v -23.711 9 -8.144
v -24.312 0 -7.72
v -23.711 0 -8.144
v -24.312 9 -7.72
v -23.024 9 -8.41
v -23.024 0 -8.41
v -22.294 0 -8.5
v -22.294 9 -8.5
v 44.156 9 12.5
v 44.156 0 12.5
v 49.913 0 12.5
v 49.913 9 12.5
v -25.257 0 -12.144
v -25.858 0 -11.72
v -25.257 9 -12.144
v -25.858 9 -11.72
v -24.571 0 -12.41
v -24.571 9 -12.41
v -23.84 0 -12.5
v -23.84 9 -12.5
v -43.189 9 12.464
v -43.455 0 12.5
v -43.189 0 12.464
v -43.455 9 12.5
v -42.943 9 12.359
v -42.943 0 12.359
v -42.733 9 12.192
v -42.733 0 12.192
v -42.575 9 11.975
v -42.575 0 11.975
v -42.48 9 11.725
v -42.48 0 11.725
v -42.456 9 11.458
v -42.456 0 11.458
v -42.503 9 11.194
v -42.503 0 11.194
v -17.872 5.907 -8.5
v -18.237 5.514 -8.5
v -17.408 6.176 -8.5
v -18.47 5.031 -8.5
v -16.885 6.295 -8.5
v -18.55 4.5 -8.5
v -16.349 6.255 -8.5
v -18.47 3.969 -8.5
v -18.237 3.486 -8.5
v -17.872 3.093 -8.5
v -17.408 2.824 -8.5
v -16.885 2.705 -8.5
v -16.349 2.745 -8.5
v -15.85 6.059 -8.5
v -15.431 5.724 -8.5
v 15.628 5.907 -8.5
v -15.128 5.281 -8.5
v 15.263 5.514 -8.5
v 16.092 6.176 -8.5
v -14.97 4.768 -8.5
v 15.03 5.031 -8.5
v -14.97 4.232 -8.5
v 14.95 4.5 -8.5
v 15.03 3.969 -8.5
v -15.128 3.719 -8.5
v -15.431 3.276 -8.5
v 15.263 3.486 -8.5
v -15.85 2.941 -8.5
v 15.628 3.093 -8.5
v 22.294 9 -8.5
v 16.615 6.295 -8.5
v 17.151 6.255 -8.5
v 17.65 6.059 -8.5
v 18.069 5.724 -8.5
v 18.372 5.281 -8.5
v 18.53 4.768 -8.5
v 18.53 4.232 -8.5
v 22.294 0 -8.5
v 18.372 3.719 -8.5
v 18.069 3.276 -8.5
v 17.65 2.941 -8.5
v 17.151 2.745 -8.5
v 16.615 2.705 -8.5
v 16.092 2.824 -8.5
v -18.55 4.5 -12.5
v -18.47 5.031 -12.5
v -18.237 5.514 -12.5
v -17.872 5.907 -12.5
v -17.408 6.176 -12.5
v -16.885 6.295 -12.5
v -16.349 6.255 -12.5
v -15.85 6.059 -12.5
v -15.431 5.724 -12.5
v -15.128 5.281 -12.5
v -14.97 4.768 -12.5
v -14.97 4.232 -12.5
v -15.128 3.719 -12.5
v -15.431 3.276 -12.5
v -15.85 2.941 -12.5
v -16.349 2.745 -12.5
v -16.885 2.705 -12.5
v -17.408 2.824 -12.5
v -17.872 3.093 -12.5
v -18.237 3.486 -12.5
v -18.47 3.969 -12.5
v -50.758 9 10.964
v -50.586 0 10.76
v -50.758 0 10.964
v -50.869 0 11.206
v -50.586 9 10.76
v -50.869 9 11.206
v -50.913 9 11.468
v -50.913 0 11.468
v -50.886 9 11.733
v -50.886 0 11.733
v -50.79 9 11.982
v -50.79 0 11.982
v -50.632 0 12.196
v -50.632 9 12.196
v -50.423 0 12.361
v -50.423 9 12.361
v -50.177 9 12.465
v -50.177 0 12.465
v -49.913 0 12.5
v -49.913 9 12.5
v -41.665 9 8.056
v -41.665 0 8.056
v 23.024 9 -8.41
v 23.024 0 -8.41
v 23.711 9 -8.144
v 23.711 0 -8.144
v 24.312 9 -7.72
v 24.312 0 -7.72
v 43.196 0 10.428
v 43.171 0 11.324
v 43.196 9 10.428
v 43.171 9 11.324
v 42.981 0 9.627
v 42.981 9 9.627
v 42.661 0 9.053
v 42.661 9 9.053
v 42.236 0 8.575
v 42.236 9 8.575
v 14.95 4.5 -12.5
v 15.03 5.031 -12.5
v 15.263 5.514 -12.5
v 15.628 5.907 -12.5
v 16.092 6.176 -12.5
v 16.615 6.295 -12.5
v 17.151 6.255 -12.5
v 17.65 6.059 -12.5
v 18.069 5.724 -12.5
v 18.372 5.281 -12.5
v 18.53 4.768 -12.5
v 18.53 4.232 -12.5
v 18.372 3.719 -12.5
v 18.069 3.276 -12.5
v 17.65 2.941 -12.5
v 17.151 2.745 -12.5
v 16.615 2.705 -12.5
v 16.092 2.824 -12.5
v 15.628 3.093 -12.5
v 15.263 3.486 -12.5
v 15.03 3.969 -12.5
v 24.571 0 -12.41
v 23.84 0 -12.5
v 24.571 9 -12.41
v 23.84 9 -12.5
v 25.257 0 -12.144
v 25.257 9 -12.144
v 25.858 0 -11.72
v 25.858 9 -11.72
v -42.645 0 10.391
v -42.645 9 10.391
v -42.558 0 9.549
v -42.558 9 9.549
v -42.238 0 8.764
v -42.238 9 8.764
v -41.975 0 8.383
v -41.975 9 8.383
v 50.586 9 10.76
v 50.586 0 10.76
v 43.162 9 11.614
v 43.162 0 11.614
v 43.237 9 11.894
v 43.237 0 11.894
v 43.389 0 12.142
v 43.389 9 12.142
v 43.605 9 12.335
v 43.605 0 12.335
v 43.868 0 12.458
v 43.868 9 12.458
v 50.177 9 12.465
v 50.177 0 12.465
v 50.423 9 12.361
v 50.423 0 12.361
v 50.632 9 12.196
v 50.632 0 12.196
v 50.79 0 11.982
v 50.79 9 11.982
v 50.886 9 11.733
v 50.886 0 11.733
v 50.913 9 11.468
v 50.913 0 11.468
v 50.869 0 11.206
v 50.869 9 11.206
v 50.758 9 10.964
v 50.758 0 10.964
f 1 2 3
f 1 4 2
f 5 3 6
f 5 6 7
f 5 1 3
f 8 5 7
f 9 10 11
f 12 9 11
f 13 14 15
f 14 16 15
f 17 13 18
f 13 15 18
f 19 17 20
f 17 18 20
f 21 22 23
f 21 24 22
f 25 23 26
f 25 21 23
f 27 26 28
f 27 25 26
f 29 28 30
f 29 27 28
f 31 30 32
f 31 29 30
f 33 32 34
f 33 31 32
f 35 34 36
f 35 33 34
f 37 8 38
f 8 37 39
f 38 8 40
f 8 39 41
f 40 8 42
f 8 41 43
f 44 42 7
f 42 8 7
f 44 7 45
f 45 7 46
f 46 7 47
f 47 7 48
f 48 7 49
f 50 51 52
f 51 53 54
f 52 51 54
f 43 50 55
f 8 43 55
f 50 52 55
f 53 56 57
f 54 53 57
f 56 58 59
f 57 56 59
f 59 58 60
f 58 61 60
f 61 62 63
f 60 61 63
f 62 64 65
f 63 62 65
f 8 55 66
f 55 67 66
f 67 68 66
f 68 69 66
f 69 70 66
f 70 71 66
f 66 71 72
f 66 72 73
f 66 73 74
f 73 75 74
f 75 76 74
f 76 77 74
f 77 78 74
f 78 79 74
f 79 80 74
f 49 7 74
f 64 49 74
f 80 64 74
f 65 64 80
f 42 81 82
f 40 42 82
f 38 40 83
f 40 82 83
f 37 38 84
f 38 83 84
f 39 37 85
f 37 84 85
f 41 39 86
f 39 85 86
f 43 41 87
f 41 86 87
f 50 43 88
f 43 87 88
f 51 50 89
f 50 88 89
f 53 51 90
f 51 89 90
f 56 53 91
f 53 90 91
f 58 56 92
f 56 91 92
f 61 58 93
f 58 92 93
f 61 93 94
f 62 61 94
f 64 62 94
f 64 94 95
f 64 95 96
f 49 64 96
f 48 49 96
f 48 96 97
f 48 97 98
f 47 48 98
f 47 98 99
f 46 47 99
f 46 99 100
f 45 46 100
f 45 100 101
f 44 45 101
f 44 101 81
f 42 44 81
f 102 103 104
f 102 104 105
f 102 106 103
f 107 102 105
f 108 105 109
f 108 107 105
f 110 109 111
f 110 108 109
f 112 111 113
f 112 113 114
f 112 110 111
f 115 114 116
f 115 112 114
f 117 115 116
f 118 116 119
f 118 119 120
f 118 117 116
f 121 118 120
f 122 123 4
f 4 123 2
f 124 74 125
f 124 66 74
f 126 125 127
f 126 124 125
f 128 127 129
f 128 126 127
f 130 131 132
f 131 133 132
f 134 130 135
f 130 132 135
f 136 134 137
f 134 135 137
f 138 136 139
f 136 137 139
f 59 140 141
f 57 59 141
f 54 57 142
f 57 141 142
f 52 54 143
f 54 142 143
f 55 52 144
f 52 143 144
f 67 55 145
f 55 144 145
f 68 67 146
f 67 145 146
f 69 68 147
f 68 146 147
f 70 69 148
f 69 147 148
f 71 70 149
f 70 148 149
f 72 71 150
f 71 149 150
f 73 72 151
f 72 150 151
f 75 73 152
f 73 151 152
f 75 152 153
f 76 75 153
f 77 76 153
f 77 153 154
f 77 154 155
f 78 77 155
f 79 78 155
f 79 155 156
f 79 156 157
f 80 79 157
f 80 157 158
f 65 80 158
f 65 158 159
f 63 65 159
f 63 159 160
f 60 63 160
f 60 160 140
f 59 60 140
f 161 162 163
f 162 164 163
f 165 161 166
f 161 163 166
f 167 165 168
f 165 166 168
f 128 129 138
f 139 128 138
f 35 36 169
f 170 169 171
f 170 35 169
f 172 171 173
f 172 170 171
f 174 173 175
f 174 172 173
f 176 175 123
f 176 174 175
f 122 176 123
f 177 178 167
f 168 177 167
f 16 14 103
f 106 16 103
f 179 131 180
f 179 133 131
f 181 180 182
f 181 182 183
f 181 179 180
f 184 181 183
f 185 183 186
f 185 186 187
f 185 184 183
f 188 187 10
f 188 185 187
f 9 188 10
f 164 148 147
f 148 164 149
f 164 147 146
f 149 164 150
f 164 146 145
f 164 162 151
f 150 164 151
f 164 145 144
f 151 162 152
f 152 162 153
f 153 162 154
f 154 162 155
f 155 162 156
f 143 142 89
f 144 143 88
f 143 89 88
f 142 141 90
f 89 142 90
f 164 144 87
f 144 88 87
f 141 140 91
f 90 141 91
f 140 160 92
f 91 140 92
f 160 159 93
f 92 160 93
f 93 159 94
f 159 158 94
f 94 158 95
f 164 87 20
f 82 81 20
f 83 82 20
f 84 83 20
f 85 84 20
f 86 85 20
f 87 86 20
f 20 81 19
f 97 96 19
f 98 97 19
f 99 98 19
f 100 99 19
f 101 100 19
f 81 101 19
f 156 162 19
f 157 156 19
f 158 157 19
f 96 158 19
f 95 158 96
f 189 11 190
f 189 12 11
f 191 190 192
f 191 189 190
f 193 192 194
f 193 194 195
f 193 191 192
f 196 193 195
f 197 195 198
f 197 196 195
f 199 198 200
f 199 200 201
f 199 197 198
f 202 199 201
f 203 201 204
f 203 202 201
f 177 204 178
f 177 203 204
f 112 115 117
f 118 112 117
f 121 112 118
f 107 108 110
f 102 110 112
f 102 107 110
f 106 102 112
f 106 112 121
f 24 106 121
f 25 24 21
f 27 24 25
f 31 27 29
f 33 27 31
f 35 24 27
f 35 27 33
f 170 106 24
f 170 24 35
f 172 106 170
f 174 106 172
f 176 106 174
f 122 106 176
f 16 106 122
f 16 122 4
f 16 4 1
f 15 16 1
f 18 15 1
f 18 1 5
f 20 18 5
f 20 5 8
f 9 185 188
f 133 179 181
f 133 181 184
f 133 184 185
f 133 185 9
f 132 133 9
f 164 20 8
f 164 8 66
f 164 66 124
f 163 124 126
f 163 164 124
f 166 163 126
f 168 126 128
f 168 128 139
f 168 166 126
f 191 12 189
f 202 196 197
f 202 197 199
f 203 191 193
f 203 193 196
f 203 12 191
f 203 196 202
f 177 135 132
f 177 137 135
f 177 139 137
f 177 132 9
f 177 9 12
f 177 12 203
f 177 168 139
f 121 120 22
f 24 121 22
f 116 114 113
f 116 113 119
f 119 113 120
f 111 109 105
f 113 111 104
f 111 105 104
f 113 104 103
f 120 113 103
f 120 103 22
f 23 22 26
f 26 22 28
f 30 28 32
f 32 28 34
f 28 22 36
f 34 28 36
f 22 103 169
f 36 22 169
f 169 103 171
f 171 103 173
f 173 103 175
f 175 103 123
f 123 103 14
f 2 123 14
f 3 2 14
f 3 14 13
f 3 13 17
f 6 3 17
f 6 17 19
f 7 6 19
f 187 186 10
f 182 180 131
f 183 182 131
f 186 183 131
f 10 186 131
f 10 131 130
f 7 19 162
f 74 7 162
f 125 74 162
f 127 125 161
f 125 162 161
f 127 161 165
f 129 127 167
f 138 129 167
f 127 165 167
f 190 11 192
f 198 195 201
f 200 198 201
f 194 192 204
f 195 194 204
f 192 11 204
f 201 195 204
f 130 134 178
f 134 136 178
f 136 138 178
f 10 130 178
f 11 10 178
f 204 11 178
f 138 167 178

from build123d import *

# Parameters (mm, degrees)
BOSS_EXTRUDE1_DEPTH  = 9
FILLET4_R            = 1
FILLET5_R            = 3
M3_CLEARANCE_HOLE1_D = 3.6


with BuildPart() as part:
    # Sketch1 → Boss-Extrude1 (new body)
    with BuildSketch(Plane(origin=(0, 0, 0), x_dir=(1, 0, 0), z_dir=(0, 1, 0))):
        Polygon((-25, 12.5), (-52.5, -12.5), (-41.5, -12.5), (-43.50199756, -9.725840963), (-23.453572501, 8.5), (23.453572501, 8.5), (44.071371219, -10.24345338), (41.5, -12.5), (52.5, -12.5), (25, 12.5), align=None)
    extrude(amount=BOSS_EXTRUDE1_DEPTH)

    # Fillet4
    fillet4_edges = [part.edges().sort_by_distance(p)[0] for p in [
        (52.5, 4.5, 12.5),
        (41.5, 4.5, 12.5),
        (-41.5, 4.5, 12.5),
        (-52.5, 4.5, 12.5),
    ]]
    fillet(fillet4_edges, radius=FILLET4_R)

    # Fillet5
    fillet5_edges = [part.edges().sort_by_distance(p)[0] for p in [
        (44.071371219, 4.5, 10.24345338),
        (25, 4.5, -12.5),
        (23.453572501, 4.5, -8.5),
        (-23.453572501, 4.5, -8.5),
        (-25, 4.5, -12.5),
        (-43.50199756, 4.5, 9.725840963),
    ]]
    fillet(fillet5_edges, radius=FILLET5_R)

    # M3 Clearance Hole1 (through all)
    with Locations(Plane.XY.offset(-8.5)):
        with Locations((-16.75, 4.5), (16.75, 4.5)):
            Hole(M3_CLEARANCE_HOLE1_D / 2)


solid = part.part
